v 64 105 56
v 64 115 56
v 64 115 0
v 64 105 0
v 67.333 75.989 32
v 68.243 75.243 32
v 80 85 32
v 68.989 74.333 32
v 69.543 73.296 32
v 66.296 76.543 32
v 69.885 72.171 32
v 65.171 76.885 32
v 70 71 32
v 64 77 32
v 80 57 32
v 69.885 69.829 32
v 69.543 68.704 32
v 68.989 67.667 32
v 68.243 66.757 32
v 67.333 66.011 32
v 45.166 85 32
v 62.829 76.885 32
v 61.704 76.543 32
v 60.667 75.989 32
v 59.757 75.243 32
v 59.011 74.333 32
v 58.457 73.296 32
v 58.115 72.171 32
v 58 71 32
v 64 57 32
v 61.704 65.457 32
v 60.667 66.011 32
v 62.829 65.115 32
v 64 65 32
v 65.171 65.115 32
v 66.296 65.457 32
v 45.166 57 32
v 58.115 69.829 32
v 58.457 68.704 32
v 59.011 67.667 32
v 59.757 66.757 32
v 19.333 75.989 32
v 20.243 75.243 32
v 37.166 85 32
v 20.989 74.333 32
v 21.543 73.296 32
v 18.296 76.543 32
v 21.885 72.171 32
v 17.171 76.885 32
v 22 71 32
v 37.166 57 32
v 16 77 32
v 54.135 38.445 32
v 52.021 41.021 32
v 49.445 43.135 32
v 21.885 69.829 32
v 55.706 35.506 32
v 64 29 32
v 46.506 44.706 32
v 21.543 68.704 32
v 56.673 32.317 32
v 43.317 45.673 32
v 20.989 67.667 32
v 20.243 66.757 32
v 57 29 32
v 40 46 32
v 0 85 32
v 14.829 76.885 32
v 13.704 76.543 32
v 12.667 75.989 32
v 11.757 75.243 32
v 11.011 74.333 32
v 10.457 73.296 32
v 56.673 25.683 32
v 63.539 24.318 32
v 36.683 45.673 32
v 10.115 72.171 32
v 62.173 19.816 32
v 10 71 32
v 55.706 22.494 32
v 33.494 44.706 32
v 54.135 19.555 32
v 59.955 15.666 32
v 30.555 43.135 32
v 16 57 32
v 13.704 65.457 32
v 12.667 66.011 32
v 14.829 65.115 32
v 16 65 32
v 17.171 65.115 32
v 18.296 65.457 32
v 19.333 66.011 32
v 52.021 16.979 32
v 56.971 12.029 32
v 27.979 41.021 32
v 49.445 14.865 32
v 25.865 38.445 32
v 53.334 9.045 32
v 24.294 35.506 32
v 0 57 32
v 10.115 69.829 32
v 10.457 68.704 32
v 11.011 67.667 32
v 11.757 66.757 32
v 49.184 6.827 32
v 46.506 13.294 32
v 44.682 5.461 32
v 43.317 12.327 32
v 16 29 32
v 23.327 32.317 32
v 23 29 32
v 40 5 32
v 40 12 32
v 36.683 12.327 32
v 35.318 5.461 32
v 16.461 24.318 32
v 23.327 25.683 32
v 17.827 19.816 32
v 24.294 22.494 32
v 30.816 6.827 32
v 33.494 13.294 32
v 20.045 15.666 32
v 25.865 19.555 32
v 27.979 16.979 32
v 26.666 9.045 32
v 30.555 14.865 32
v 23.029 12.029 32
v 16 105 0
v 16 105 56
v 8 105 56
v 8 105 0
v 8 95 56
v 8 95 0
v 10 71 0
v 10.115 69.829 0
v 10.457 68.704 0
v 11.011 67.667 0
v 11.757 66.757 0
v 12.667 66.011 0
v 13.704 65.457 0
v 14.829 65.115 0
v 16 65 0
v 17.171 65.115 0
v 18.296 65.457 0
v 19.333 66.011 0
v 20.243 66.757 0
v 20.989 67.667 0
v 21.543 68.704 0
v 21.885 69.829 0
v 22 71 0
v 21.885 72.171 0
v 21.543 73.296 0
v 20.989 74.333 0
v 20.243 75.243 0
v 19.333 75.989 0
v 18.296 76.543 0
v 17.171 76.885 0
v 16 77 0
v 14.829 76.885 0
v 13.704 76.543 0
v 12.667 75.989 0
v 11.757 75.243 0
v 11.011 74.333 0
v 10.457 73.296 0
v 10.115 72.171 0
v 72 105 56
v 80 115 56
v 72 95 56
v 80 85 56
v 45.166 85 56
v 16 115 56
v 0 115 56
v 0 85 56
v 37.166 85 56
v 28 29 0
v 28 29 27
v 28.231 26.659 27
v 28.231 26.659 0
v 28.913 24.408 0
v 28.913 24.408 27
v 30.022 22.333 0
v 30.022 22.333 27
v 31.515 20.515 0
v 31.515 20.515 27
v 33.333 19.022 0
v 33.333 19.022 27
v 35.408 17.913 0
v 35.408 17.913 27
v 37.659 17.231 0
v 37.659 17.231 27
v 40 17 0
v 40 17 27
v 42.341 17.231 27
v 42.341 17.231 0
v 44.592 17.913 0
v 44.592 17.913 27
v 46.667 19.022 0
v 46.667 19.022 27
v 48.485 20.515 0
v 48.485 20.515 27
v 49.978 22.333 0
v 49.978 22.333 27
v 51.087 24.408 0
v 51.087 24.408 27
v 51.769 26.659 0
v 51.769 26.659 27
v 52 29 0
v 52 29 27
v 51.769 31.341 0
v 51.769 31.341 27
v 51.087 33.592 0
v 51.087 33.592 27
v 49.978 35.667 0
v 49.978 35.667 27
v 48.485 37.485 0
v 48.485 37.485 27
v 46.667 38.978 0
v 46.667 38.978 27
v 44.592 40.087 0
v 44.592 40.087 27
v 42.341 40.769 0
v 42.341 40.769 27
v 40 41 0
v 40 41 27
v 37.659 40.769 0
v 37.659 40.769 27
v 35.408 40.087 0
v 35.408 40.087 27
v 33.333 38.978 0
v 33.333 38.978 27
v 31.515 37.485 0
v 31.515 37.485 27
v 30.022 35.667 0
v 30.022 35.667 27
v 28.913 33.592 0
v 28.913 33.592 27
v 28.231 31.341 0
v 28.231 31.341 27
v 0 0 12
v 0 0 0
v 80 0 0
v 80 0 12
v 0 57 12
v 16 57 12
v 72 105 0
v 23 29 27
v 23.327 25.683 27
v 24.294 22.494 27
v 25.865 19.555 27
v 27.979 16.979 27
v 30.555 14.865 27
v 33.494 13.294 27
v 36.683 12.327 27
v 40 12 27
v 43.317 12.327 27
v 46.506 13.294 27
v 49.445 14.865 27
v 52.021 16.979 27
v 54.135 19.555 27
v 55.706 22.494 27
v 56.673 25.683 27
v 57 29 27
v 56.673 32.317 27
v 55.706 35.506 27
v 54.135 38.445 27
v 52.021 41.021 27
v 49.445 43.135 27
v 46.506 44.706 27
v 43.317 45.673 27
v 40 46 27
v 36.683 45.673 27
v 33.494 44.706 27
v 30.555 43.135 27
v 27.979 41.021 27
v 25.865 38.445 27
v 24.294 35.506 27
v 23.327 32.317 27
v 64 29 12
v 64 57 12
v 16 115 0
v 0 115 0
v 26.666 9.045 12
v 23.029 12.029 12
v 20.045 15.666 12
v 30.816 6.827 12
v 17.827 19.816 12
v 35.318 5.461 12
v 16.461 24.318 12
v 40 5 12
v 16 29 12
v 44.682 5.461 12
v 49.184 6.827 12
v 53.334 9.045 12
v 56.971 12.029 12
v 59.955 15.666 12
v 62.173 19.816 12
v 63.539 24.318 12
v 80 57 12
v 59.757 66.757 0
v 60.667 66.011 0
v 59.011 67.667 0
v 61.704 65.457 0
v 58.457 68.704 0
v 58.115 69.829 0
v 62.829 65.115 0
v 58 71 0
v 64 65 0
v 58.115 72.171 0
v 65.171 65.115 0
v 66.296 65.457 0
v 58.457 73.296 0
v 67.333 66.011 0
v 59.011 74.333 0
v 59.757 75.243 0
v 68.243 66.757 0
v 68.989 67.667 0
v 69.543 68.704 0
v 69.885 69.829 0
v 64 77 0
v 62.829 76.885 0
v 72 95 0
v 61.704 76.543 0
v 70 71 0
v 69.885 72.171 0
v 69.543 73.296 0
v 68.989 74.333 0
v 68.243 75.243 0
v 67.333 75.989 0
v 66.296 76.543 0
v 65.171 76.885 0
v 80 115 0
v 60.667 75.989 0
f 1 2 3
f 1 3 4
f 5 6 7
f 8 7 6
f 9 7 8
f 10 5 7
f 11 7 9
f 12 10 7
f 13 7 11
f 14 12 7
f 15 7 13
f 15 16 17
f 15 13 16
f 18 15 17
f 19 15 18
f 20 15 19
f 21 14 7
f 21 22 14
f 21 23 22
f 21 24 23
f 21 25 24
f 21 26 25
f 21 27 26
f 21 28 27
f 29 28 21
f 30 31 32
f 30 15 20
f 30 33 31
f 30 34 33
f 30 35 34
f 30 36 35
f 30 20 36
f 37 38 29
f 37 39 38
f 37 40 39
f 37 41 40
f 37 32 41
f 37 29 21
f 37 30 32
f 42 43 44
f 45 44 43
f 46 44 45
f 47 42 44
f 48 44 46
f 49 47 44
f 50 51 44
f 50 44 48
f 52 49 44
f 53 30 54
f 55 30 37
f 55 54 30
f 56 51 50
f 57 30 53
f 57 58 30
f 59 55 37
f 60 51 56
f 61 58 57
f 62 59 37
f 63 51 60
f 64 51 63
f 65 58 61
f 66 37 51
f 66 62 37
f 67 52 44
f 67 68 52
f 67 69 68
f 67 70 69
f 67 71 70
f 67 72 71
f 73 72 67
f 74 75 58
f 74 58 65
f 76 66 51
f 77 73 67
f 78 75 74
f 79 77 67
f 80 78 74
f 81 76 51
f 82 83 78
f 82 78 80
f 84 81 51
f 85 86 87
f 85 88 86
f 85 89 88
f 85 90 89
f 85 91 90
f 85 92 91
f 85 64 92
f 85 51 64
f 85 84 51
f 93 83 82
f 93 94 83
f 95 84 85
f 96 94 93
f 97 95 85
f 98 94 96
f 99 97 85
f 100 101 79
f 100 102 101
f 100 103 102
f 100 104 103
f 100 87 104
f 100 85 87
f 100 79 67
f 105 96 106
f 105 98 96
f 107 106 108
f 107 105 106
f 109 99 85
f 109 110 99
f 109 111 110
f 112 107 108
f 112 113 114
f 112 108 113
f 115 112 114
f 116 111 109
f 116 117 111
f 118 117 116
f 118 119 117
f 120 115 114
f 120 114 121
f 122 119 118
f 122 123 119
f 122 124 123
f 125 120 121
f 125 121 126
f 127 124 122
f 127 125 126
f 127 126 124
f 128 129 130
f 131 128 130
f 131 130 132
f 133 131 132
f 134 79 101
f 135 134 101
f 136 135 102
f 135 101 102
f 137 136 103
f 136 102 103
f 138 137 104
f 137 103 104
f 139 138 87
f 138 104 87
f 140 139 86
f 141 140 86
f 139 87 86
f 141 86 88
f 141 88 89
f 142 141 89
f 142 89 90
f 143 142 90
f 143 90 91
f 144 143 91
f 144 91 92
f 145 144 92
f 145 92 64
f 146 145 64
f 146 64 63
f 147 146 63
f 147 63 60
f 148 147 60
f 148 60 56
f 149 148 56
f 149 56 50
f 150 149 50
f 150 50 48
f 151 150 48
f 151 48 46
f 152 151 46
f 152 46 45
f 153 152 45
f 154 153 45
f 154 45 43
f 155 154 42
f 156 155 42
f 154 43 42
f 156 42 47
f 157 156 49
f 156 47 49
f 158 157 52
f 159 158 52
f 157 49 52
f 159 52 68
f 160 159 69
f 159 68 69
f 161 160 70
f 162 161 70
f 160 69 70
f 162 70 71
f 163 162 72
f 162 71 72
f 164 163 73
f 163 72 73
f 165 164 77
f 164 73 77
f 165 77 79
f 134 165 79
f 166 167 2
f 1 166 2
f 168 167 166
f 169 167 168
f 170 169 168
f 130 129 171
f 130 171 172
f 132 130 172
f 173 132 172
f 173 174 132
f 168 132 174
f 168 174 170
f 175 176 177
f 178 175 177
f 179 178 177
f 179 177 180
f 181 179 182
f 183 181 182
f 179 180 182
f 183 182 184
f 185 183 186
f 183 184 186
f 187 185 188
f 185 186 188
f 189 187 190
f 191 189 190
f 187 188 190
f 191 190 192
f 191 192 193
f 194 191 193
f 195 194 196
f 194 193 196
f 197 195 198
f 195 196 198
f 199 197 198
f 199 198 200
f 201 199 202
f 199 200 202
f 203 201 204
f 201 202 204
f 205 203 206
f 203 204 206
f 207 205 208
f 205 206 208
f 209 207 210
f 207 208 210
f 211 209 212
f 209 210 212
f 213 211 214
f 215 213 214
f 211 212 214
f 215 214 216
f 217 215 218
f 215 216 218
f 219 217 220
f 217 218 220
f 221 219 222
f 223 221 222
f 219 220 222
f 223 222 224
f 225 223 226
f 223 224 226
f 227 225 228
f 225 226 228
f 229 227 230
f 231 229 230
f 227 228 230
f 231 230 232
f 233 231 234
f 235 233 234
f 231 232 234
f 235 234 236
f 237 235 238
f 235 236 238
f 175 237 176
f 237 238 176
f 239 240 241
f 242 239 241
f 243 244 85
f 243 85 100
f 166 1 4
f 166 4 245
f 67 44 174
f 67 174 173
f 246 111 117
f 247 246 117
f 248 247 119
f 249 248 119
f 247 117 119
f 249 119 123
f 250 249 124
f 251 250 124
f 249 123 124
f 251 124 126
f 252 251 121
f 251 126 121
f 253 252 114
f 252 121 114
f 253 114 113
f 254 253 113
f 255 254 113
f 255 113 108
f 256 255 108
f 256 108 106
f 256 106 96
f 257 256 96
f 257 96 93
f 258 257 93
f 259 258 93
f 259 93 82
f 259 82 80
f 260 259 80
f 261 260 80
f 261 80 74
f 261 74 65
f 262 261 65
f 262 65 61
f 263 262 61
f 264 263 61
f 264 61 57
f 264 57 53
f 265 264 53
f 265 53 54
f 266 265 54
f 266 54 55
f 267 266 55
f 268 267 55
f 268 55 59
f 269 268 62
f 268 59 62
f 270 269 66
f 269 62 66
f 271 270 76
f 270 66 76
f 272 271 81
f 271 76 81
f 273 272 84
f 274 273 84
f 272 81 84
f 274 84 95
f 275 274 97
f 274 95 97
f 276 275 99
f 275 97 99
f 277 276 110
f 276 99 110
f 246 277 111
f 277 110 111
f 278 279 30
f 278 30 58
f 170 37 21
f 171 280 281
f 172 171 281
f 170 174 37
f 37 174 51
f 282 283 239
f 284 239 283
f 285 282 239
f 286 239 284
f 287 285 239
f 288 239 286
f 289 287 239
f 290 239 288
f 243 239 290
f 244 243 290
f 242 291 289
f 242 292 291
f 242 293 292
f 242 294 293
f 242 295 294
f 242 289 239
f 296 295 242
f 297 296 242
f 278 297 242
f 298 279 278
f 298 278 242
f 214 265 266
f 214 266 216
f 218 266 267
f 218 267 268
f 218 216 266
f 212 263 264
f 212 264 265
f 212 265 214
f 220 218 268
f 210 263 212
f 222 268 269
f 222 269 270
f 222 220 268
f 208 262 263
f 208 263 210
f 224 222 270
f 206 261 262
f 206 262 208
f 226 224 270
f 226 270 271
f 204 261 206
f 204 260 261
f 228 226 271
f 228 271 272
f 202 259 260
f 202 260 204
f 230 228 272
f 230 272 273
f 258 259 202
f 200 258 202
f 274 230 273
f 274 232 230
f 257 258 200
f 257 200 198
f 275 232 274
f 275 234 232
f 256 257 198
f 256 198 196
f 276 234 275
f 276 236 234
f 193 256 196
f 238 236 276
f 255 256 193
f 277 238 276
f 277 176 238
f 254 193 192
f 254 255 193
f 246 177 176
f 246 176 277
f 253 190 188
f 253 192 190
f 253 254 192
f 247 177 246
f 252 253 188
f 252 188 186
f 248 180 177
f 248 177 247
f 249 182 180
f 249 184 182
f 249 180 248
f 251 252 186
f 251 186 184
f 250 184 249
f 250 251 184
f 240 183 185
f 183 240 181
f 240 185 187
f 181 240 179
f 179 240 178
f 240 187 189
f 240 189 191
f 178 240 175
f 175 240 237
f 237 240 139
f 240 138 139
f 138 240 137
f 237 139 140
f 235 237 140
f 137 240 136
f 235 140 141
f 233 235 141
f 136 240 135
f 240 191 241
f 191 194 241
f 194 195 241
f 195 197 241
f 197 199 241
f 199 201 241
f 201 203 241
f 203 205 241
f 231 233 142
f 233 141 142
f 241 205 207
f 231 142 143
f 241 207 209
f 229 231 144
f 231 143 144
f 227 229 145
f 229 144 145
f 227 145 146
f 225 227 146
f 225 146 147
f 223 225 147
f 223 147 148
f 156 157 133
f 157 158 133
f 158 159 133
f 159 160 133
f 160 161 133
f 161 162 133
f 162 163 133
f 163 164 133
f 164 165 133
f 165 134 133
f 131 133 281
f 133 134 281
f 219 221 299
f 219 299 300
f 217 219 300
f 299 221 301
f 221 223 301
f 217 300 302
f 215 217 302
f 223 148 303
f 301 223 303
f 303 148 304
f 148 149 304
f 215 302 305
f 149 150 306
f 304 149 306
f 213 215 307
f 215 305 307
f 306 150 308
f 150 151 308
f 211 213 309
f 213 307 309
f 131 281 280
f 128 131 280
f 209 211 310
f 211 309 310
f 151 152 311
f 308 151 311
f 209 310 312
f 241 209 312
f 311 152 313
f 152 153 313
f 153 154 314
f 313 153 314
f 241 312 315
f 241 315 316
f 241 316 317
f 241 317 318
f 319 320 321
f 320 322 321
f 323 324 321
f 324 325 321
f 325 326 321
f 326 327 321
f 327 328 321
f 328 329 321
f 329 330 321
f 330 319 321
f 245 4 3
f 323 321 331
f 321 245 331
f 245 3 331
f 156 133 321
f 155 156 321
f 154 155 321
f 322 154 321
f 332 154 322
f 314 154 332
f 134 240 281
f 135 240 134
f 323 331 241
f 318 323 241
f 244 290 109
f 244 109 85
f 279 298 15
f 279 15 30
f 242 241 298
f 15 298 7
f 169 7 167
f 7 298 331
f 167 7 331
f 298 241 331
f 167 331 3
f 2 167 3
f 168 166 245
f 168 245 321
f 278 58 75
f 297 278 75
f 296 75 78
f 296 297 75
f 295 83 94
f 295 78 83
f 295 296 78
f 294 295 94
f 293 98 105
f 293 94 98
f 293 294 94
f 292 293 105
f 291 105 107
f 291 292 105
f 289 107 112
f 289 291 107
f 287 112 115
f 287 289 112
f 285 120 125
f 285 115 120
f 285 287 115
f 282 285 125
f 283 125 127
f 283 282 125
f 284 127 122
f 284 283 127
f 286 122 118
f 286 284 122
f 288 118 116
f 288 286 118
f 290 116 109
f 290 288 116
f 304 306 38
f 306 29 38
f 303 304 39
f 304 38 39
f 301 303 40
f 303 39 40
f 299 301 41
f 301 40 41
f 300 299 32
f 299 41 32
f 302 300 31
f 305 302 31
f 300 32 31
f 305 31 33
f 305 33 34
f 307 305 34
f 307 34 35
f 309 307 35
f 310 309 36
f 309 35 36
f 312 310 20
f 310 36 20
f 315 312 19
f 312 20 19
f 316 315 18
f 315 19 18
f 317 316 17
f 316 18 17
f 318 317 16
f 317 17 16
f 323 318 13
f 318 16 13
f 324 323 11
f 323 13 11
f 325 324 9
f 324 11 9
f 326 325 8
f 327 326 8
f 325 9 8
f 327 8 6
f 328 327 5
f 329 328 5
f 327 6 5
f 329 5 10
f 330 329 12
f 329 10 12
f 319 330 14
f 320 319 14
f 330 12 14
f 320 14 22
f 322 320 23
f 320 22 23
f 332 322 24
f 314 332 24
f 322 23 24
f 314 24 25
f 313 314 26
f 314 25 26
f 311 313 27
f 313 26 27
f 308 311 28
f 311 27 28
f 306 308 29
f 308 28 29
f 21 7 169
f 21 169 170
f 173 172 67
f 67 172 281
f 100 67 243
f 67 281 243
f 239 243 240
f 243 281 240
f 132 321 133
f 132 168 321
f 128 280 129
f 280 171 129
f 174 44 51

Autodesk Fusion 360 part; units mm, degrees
sketch "Sketch1" plane through (0, 0, 0) normal (0, 0, 1) x (1, 0, 0)
  line L0 (0, 0) -> (80, 0)
  line L1 (80, 0) -> (80, 115)
  line L2 (80, 115) -> (0, 115)
  line L3 (0, 115) -> (0, 0)
  dimension "d1" = 80
  dimension "d2" = 115
sketch "Sketch2" plane through (0, 0, 0) normal (0, 0, 1) x (1, 0, 0)
extrude "Extrude1" add sketch "Sketch1" along normal blind 12
sketch "Sketch3" plane through (0, 0, 12) normal (0, 0, 1) x (-1, 0, 0)
  line L0 (0, -115) -> (0, 0)
  line L1 (0, 0) -> (-80, 0)
  line L2 (-80, 0) -> (-80, -115)
  line L3 (-80, -115) -> (0, -115)
  line L4 (0, -115) -> (-80, -115)
  line L5 (-80, -115) -> (-80, -57)
  line L6 (-80, -57) -> (0, -57)
  line L7 (0, -57) -> (0, -115)
  line L8 (-16, -57) -> (-64, -57)
  line L9 (-64, -57) -> (-64, -29)
  line L10 (-64, -29) -> (-16, -29)
  line L11 (-16, -29) -> (-16, -57)
  circle A0 centre (-40, -29) radius 24
  dimension "d5" = 58
  dimension "d6" = 48
  dimension "d7" = 28
extrude "Extrude2" add sketch "Sketch3" along normal blind 20 contours L0 L2 L3 L4 L5 L6 L7 L8 | L6 L8 L9 L11 A0 | L10 A0 | L10 A0
sketch "Sketch4" plane through (0, 0, 32) normal (0, 0, 1) x (-1, 0, 0)
  line L0 (-16, -57) -> (-16, -29)
  arc A0 (-16, -29) -> (-64, -29) centre (-40, -29) ccw
  line L1 (-64, -29) -> (-64, -57)
  line L2 (-64, -57) -> (-80, -57)
  line L3 (-80, -57) -> (-80, -115)
  line L4 (-80, -115) -> (0, -115)
  line L5 (0, -115) -> (0, -57)
  line L6 (0, -57) -> (-16, -57)
  line L7 (0, -115) -> (-80, -115)
  line L8 (-80, -115) -> (-80, -85)
  line L9 (-80, -85) -> (0, -85)
  line L10 (0, -85) -> (0, -115)
  line L11 (-40, -85) -> (-37.1656, -85)
  line L12 (-37.1656, -85) -> (-37.1656, -57)
  line L13 (-37.1656, -57) -> (-40, -57)
  line L14 (-40, -57) -> (-40, -85)
  line L15 (-37.1656, -57) -> (-45.1656, -57)
  line L16 (-45.1656, -57) -> (-45.1656, -85)
  line L17 (-45.1656, -85) -> (-37.1656, -85)
  line L18 (-37.1656, -85) -> (-37.1656, -57)
  dimension "d10" = 28
  dimension "d11" = 8
extrude "Extrude3" add sketch "Sketch4" along normal blind 24 contours L3 L4 L5 L7 L8 L9 L10 L11 L17 | L9 L11 L12 L13 L14 L15 L17 L18 | L9 L14 L15 L16 L17
sketch "Sketch5" plane through (37.1656, 0, 0) normal (-1, 0, 0) x (0, -1, 0)
  line L0 (-85, 32) -> (-57, 32)
  line L1 (-57, 32) -> (-57, 56)
  line L2 (-57, 56) -> (-85, 56)
  line L3 (-85, 56) -> (-85, 32)
  line L4 (-85, 56) -> (-57, 32)
  line L5 (-85, 56) -> (-57, 56)
  line L6 (-57, 32) -> (-57, 56)
extrude "Extrude4" cut sketch "Sketch5" against normal blind 8 contours L1 L2 L4 L5 L6
sketch "Sketch6" plane through (0, 0, 56) normal (0, 0, 1) x (-1, 0, 0)
  line L0 (-37.1656, -85) -> (-45.1656, -85)
  line L1 (-45.1656, -85) -> (-80, -85)
  line L2 (-80, -85) -> (-80, -115)
  line L3 (-80, -115) -> (0, -115)
  line L4 (0, -115) -> (0, -85)
  line L5 (0, -85) -> (-37.1656, -85)
  line L6 (0, -115) -> (-16, -115)
  line L7 (-16, -115) -> (-16, -105)
  line L8 (-16, -105) -> (-8, -105)
  line L9 (-8, -105) -> (-8, -95)
  line L10 (-80, -115) -> (-64, -115)
  line L11 (-64, -115) -> (-64, -105)
  line L12 (-64, -105) -> (-72, -105)
  line L13 (-72, -105) -> (-72, -95)
  line L14 (-72, -95) -> (-8, -95)
  line L15 (-16, -115) -> (-64, -115)
  dimension "d16" = 16
  dimension "d17" = 10
  dimension "d18" = 10
  dimension "d19" = 16
  dimension "d20" = 8
extrude "Extrude5" cut sketch "Sketch6" against normal blind 90 contours L3 L7 L8 L9 L11 L12 L13 L14 L15
sketch "Sketch7" plane through (0, 0, 32) normal (0, 0, 1) x (-1, 0, 0)
  line L0 (-80, -85) -> (-45.1656, -85)
  line L1 (-45.1656, -85) -> (-45.1656, -57)
  line L2 (-45.1656, -57) -> (-37.1656, -57)
  line L3 (-37.1656, -57) -> (-37.1656, -85)
  line L4 (-37.1656, -85) -> (0, -85)
  line L5 (0, -85) -> (0, -57)
  line L6 (0, -57) -> (-16, -57)
  line L7 (-16, -57) -> (-16, -29)
  arc A0 (-16, -29) -> (-64, -29) centre (-40, -29) ccw
  line L8 (-64, -29) -> (-64, -57)
  line L9 (-64, -57) -> (-80, -57)
  line L10 (-80, -57) -> (-80, -85)
  circle A1 centre (-40, -29) radius 17
  dimension "d23" = 34
extrude "Extrude6" cut sketch "Sketch7" against normal blind 5 contours A1
sketch "Sketch8" plane through (0, 0, 27) normal (0, 0, 1) x (-1, 0, 0)
  circle A0 centre (-40, -29) radius 17
  circle A1 centre (-40, -29) radius 12
  dimension "d26" = 24
extrude "Extrude7" cut sketch "Sketch8" against normal blind 49 contours A1
sketch "Sketch9" plane through (0, 0, 32) normal (0, 0, 1) x (-1, 0, 0)
  circle A0 centre (-40, -29) radius 17
  line L0 (-80, -85) -> (-45.1656, -85)
  line L1 (-45.1656, -85) -> (-45.1656, -57)
  line L2 (-45.1656, -57) -> (-37.1656, -57)
  line L3 (-37.1656, -57) -> (-37.1656, -85)
  line L4 (-37.1656, -85) -> (0, -85)
  line L5 (0, -85) -> (0, -57)
  line L6 (0, -57) -> (-16, -57)
  line L7 (-16, -57) -> (-16, -29)
  arc A1 (-16, -29) -> (-64, -29) centre (-40, -29) ccw
  line L8 (-64, -29) -> (-64, -57)
  line L9 (-64, -57) -> (-80, -57)
  line L10 (-80, -57) -> (-80, -85)
  circle A2 centre (-16, -71) radius 6
  circle A3 centre (-64, -71) radius 6
  dimension "d29" = 12
  dimension "d30" = 12
extrude "Extrude8" cut sketch "Sketch9" against normal blind 46 contours A2 | A3
